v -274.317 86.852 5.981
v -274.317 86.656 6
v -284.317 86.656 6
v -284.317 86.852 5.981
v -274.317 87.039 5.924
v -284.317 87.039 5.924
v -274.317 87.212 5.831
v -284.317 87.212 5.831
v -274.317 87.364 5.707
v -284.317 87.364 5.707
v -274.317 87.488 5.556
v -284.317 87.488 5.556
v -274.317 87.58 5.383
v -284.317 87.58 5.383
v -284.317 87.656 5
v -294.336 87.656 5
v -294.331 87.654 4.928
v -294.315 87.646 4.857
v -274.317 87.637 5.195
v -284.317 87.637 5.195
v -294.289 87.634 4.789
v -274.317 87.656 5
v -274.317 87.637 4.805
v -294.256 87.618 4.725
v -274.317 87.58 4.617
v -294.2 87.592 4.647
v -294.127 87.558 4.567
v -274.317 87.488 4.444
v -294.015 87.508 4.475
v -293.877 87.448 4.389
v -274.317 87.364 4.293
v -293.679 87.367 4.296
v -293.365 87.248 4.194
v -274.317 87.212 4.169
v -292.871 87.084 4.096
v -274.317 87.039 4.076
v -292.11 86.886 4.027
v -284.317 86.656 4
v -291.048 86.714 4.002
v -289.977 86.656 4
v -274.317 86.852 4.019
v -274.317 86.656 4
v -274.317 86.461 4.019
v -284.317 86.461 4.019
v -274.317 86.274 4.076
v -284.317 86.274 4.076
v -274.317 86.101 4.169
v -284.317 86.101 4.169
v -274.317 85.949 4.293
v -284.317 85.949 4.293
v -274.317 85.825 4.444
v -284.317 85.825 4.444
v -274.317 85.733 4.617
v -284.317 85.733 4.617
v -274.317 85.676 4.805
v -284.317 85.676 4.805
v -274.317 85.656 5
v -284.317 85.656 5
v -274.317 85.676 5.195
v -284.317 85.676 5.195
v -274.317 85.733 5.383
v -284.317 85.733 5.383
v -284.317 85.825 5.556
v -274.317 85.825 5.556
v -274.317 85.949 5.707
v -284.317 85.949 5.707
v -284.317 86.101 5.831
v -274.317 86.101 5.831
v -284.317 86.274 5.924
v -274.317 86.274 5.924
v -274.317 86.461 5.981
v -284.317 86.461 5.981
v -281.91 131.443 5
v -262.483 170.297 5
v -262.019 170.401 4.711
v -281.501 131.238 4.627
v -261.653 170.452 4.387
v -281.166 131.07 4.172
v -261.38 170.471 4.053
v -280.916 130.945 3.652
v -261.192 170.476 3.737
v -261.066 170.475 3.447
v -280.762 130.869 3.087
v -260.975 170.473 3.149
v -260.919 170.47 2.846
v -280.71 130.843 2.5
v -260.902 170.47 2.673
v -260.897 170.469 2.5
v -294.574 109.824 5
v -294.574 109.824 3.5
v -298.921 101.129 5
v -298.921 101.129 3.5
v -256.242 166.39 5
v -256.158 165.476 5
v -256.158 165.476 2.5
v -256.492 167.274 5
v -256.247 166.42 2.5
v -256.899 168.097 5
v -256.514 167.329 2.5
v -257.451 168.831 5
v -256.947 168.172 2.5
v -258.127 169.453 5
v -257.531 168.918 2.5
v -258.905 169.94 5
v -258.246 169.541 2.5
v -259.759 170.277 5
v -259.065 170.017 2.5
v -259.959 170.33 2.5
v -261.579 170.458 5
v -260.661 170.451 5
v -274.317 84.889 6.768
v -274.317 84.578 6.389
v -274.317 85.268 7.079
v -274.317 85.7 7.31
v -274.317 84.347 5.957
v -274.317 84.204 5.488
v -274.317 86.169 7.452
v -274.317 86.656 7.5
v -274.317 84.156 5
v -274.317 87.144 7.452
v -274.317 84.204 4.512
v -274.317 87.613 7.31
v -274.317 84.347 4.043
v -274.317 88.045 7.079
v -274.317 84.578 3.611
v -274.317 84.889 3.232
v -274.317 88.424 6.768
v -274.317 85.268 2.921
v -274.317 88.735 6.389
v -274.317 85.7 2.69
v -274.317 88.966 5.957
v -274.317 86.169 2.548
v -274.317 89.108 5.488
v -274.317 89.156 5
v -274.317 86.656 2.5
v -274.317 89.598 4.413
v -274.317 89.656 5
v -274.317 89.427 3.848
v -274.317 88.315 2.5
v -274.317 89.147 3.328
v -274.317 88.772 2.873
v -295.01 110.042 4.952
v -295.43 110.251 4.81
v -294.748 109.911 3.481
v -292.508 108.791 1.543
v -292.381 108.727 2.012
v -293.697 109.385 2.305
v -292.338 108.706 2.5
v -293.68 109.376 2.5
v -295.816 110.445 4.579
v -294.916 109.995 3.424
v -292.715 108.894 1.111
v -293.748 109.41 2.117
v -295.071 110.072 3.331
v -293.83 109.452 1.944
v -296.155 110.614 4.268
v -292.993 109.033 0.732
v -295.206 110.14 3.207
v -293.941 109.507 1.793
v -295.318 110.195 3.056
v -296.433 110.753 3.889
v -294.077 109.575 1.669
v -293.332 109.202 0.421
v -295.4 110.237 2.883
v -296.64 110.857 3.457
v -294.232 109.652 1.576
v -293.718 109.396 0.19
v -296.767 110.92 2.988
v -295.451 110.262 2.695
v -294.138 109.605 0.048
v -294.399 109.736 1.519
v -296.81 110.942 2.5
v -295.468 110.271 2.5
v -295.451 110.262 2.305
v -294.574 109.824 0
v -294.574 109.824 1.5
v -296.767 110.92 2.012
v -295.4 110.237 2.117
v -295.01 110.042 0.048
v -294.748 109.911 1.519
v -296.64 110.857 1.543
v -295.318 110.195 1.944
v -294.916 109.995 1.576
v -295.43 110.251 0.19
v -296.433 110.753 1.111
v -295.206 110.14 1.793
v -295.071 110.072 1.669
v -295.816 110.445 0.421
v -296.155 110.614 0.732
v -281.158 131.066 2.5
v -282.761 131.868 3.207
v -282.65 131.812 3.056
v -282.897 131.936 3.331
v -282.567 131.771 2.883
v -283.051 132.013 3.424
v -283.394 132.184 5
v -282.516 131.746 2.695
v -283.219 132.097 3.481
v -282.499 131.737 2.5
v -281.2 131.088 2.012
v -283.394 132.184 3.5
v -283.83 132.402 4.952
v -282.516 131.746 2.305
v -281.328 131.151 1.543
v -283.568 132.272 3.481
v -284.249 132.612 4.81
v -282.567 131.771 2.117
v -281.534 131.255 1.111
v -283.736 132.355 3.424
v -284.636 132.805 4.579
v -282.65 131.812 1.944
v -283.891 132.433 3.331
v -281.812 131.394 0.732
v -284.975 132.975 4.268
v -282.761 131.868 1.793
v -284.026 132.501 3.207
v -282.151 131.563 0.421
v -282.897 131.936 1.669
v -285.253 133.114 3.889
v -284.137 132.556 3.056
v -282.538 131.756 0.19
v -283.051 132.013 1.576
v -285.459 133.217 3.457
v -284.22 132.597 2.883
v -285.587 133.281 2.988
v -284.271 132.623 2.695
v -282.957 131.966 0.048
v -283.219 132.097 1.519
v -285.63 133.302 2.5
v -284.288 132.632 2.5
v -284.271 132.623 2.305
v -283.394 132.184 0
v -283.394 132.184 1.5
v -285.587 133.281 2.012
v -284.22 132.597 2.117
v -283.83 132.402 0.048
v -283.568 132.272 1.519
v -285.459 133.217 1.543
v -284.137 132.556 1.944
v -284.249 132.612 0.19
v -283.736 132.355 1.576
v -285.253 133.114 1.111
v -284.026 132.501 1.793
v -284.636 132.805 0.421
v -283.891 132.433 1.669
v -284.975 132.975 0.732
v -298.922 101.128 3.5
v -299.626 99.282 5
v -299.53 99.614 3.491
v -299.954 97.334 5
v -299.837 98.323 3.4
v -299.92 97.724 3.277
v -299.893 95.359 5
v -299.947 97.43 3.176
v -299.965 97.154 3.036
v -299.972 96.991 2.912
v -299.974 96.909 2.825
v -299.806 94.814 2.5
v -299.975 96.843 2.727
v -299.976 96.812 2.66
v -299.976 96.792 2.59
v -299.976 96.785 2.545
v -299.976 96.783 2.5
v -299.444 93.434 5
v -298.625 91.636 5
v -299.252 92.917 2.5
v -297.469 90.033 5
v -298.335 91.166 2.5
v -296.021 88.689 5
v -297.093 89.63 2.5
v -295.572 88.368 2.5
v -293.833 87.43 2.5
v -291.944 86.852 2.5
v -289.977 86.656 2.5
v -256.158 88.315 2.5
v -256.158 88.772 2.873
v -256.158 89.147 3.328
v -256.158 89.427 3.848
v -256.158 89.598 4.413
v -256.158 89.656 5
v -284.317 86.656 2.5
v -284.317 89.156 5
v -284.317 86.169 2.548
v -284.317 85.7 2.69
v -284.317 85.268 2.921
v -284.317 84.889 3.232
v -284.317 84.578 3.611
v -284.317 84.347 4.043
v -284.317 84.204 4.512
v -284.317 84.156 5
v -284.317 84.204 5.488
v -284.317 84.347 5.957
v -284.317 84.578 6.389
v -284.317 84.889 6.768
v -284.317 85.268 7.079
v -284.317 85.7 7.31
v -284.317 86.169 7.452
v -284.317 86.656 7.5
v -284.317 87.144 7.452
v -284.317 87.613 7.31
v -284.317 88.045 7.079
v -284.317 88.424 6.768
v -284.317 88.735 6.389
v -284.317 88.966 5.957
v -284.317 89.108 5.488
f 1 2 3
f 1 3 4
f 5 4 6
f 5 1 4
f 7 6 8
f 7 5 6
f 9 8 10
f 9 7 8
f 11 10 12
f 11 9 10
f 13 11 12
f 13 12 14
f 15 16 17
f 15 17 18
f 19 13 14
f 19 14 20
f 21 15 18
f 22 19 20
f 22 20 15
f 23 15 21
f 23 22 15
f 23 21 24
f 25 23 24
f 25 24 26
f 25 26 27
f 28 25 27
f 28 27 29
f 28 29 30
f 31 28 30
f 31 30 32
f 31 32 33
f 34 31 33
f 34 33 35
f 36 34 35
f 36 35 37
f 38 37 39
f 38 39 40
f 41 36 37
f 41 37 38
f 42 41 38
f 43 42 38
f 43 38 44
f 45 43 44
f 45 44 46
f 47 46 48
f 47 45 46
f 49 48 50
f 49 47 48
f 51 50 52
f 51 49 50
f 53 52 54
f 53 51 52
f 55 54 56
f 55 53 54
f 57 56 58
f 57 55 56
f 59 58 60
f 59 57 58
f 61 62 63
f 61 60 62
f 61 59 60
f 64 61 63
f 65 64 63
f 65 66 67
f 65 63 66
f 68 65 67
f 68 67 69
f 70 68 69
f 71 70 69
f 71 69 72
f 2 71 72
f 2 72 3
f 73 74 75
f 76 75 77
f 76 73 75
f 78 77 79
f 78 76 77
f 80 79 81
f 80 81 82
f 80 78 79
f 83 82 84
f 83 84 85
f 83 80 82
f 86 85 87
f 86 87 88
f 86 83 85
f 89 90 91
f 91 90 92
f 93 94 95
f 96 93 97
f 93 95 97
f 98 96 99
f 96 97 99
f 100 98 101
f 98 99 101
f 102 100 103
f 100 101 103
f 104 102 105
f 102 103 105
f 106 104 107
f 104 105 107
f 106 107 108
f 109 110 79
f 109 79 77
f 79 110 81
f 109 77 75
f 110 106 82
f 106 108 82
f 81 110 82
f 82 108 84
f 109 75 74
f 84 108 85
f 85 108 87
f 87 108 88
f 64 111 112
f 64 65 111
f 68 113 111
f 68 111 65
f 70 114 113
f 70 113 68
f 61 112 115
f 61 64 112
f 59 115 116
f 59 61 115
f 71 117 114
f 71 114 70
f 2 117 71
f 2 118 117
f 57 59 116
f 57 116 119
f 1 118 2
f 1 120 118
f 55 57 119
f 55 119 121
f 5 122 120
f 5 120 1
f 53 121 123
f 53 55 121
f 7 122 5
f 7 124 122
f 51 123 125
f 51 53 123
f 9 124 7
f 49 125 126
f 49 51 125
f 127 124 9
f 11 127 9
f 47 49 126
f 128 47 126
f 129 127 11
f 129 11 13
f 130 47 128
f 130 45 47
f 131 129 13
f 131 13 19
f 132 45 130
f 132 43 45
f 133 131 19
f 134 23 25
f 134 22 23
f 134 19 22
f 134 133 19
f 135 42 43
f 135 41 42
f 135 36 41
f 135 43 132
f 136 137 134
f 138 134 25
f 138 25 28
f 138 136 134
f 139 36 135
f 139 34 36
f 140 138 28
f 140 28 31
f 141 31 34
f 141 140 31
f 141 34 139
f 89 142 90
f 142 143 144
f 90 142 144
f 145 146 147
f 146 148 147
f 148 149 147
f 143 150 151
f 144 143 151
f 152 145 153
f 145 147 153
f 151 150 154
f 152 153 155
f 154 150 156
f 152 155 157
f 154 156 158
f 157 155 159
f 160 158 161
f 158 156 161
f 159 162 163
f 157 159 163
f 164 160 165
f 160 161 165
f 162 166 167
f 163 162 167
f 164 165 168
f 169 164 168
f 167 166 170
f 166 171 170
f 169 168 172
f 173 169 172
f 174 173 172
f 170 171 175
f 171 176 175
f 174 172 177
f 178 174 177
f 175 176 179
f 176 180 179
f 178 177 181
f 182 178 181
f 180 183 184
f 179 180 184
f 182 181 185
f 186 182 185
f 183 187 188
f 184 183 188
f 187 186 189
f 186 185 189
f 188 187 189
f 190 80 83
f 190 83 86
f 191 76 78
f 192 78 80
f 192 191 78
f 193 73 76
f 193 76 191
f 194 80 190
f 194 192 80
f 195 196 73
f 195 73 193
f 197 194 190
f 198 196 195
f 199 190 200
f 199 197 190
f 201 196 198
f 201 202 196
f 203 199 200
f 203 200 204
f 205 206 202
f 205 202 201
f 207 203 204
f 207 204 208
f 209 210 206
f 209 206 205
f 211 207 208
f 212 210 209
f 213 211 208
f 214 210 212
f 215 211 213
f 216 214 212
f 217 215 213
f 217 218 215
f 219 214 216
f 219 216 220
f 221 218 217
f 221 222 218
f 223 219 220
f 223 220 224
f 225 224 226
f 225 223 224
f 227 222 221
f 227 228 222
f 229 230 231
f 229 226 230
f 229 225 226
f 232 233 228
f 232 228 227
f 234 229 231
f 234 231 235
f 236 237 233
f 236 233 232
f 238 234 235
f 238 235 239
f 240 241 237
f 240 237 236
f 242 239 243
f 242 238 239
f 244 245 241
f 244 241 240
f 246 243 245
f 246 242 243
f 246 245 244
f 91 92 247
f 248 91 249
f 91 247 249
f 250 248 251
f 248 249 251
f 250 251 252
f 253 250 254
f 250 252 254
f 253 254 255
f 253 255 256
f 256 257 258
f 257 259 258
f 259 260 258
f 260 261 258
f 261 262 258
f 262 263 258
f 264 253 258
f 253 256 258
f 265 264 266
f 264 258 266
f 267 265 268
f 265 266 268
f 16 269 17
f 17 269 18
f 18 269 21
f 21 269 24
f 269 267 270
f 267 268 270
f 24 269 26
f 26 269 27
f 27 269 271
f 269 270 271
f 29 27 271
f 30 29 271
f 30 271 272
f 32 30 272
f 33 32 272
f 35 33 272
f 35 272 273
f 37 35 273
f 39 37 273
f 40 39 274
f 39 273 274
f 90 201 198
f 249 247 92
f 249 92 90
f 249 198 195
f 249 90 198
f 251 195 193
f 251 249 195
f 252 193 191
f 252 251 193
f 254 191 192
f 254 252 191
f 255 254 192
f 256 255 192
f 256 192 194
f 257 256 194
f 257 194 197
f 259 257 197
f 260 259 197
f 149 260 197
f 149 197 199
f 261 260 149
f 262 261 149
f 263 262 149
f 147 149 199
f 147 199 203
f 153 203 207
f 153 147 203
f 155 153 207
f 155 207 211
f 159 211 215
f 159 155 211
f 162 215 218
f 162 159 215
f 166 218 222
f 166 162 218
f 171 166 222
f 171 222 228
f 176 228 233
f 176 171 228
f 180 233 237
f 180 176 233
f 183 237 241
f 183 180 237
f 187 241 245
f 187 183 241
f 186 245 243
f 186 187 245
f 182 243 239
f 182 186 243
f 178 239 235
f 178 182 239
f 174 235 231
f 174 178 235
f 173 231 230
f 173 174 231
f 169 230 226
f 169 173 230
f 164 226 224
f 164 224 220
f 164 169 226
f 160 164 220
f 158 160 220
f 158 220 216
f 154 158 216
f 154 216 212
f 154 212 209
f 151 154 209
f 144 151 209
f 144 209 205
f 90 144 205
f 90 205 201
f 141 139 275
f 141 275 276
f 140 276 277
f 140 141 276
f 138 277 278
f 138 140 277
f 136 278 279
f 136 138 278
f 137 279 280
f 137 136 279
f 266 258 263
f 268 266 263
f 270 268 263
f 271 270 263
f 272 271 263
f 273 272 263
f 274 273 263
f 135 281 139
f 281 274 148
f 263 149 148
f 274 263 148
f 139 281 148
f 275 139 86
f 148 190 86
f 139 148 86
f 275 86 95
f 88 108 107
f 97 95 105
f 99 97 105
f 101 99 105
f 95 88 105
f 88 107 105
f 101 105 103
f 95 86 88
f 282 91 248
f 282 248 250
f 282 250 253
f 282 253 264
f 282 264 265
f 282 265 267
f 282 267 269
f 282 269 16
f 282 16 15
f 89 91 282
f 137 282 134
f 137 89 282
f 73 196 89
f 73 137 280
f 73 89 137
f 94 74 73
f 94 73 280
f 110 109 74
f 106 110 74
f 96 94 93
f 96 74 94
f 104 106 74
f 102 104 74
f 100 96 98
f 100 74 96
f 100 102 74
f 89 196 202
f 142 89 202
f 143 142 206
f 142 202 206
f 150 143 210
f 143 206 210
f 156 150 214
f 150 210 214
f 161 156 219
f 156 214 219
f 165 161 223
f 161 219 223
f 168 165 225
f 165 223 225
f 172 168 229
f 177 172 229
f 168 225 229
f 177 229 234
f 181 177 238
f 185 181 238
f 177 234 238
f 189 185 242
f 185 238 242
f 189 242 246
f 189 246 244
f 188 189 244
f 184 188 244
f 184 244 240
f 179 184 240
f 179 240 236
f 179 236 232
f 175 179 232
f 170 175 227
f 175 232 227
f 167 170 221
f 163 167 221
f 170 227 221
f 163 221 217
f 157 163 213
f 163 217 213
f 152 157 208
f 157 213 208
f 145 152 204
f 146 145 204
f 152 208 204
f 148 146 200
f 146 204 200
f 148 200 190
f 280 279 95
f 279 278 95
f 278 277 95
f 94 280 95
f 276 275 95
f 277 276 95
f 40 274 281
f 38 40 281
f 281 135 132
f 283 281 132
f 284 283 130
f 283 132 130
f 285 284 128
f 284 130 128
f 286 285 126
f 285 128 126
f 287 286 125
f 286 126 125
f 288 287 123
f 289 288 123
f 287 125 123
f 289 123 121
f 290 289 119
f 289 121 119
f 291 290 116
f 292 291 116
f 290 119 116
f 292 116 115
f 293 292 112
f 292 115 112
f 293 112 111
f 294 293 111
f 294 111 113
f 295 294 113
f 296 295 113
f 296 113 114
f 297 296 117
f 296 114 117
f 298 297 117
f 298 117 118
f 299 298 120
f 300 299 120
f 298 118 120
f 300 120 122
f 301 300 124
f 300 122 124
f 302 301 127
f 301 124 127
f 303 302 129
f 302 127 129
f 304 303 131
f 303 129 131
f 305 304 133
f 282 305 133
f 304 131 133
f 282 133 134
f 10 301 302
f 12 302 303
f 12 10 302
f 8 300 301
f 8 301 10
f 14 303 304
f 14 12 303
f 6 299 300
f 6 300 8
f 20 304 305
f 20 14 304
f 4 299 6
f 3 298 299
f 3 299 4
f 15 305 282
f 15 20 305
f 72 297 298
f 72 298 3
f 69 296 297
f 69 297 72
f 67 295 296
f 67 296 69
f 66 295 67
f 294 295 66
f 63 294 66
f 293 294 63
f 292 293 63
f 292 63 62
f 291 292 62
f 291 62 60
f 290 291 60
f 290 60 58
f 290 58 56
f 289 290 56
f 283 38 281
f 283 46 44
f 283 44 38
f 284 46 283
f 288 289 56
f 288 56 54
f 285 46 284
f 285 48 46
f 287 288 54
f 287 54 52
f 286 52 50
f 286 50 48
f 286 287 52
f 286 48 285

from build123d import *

# Parameters (mm, degrees)
EXTRUDE_1_DEPTH          = 5
SKETCH_3_W               = 5
SKETCH_3_H               = 50
CUT_EXTRUDE_1_DEPTH      = 692.252839152
CUT_EXTRUDE_1_DEPTH_BACK = 692.252839152
SKETCH_5_R               = 2
SKETCH_7_R               = 6
CUT_EXTRUDE_2_DEPTH      = 692.25283929
SKETCH_2_W               = 20
SKETCH_2_H               = 5
SKETCH_8_R               = 6
CUT_EXTRUDE_3_DEPTH      = 346.118964709
CUT_EXTRUDE_4_DEPTH      = 346.897812083
CUT_EXTRUDE_4_DEPTH_BACK = 346.897812083
SKETCH_9_R               = 2
SCALE_1_SCALE            = 0.5


with BuildPart() as part:
    # 草图1 → 凸台-拉伸1 (new body)
    with BuildSketch(Plane.XY.offset(5)):
        with BuildLine():
            Line((-531.259329651, 335.424320593), (-597.842921786, 202.257136323))
            ThreePointArc((-597.842921786, 202.257136323), (-596.967394134, 182.798242171), (-579.954377966, 173.312864413))
            Line((-579.954377966, 173.312864413), (-512.315057741, 173.312864413))
            Line((-512.315057741, 173.312864413), (-512.315057741, 330.952184638))
            ThreePointArc((-512.315057741, 330.952184638), (-520.017528536, 340.684674533), (-531.259329651, 335.424320593))
        make_face()
    extrude(amount=EXTRUDE_1_DEPTH)

    # 草图3 → 旋转1 (revolve)
    with BuildSketch(Plane(origin=(-559.177191958, 279.588595979, 0), x_dir=(0, 0, 1), z_dir=(-0.894427190999916, 0.4472135954999579, 0))):
        with Locations((7.5, -42.016481195)):
            Rectangle(SKETCH_3_W, SKETCH_3_H)
    revolve(axis=Axis((-566.787193696, 264.368592503, 5), (-0.447213595499958, -0.894427190999916, 0)))

    # 草图5 → 切除-拉伸1 (cut, two sides: drawn at the far end of the back side and taken through both)
    with BuildSketch(Plane(origin=(-7.610001738, -15.220003476, 0), x_dir=(0.894427190999916, -0.4472135954999579, 0), z_dir=(0.4472135954999579, 0.894427190999916, 0)).offset(-CUT_EXTRUDE_1_DEPTH_BACK)):
        with Locations(Location((-625.179106343, -5, 0), (0, 0, 270))):
            Circle(SKETCH_5_R)
    extrude(amount=CUT_EXTRUDE_1_DEPTH + CUT_EXTRUDE_1_DEPTH_BACK, mode=Mode.SUBTRACT)

    # 草图7 → 切除-拉伸2 (cut, through all)
    with BuildSketch(Plane(origin=(-7.610001738, -15.220003476, 0), x_dir=(0.894427190999916, -0.4472135954999579, 0), z_dir=(0.4472135954999579, 0.894427190999916, 0))):
        with Locations((-625.179106343, -5)):
            Circle(SKETCH_7_R)
    extrude(amount=CUT_EXTRUDE_2_DEPTH, mode=Mode.SUBTRACT)

    # 草图2 → 旋转2 (revolve)
    with BuildSketch(Plane.XZ.offset(-173.312864413)):
        with Locations((-558.634717854, 7.5)):
            Rectangle(SKETCH_2_W, SKETCH_2_H)
    revolve(axis=Axis((-548.634717854, 173.312864413, 10), (-1, 0, 0)))

    # 草图8 → 切除-拉伸3 (cut, through all)
    with BuildSketch(Plane(origin=(-548.634717854, 0, 0), x_dir=(0, 0, -1), z_dir=(1, 0, 0))):
        with Locations((-10, 173.312864413)):
            Circle(SKETCH_8_R)
    extrude(amount=CUT_EXTRUDE_3_DEPTH, mode=Mode.SUBTRACT)

    # 草图9 → 切除-拉伸4 (cut, two sides: drawn at the far end of the back side and taken through both)
    with BuildSketch(Plane.ZY.offset(568.634717854).offset(-CUT_EXTRUDE_4_DEPTH_BACK)):
        with Locations((10, 173.312864413)):
            Circle(SKETCH_9_R)
    extrude(amount=CUT_EXTRUDE_4_DEPTH + CUT_EXTRUDE_4_DEPTH_BACK, mode=Mode.SUBTRACT)


with BuildPart() as part_1:
    # 缩放比例1: scaled about (0, 0, 0)
    add(part.part.scale(SCALE_1_SCALE))


solid = part_1.part
